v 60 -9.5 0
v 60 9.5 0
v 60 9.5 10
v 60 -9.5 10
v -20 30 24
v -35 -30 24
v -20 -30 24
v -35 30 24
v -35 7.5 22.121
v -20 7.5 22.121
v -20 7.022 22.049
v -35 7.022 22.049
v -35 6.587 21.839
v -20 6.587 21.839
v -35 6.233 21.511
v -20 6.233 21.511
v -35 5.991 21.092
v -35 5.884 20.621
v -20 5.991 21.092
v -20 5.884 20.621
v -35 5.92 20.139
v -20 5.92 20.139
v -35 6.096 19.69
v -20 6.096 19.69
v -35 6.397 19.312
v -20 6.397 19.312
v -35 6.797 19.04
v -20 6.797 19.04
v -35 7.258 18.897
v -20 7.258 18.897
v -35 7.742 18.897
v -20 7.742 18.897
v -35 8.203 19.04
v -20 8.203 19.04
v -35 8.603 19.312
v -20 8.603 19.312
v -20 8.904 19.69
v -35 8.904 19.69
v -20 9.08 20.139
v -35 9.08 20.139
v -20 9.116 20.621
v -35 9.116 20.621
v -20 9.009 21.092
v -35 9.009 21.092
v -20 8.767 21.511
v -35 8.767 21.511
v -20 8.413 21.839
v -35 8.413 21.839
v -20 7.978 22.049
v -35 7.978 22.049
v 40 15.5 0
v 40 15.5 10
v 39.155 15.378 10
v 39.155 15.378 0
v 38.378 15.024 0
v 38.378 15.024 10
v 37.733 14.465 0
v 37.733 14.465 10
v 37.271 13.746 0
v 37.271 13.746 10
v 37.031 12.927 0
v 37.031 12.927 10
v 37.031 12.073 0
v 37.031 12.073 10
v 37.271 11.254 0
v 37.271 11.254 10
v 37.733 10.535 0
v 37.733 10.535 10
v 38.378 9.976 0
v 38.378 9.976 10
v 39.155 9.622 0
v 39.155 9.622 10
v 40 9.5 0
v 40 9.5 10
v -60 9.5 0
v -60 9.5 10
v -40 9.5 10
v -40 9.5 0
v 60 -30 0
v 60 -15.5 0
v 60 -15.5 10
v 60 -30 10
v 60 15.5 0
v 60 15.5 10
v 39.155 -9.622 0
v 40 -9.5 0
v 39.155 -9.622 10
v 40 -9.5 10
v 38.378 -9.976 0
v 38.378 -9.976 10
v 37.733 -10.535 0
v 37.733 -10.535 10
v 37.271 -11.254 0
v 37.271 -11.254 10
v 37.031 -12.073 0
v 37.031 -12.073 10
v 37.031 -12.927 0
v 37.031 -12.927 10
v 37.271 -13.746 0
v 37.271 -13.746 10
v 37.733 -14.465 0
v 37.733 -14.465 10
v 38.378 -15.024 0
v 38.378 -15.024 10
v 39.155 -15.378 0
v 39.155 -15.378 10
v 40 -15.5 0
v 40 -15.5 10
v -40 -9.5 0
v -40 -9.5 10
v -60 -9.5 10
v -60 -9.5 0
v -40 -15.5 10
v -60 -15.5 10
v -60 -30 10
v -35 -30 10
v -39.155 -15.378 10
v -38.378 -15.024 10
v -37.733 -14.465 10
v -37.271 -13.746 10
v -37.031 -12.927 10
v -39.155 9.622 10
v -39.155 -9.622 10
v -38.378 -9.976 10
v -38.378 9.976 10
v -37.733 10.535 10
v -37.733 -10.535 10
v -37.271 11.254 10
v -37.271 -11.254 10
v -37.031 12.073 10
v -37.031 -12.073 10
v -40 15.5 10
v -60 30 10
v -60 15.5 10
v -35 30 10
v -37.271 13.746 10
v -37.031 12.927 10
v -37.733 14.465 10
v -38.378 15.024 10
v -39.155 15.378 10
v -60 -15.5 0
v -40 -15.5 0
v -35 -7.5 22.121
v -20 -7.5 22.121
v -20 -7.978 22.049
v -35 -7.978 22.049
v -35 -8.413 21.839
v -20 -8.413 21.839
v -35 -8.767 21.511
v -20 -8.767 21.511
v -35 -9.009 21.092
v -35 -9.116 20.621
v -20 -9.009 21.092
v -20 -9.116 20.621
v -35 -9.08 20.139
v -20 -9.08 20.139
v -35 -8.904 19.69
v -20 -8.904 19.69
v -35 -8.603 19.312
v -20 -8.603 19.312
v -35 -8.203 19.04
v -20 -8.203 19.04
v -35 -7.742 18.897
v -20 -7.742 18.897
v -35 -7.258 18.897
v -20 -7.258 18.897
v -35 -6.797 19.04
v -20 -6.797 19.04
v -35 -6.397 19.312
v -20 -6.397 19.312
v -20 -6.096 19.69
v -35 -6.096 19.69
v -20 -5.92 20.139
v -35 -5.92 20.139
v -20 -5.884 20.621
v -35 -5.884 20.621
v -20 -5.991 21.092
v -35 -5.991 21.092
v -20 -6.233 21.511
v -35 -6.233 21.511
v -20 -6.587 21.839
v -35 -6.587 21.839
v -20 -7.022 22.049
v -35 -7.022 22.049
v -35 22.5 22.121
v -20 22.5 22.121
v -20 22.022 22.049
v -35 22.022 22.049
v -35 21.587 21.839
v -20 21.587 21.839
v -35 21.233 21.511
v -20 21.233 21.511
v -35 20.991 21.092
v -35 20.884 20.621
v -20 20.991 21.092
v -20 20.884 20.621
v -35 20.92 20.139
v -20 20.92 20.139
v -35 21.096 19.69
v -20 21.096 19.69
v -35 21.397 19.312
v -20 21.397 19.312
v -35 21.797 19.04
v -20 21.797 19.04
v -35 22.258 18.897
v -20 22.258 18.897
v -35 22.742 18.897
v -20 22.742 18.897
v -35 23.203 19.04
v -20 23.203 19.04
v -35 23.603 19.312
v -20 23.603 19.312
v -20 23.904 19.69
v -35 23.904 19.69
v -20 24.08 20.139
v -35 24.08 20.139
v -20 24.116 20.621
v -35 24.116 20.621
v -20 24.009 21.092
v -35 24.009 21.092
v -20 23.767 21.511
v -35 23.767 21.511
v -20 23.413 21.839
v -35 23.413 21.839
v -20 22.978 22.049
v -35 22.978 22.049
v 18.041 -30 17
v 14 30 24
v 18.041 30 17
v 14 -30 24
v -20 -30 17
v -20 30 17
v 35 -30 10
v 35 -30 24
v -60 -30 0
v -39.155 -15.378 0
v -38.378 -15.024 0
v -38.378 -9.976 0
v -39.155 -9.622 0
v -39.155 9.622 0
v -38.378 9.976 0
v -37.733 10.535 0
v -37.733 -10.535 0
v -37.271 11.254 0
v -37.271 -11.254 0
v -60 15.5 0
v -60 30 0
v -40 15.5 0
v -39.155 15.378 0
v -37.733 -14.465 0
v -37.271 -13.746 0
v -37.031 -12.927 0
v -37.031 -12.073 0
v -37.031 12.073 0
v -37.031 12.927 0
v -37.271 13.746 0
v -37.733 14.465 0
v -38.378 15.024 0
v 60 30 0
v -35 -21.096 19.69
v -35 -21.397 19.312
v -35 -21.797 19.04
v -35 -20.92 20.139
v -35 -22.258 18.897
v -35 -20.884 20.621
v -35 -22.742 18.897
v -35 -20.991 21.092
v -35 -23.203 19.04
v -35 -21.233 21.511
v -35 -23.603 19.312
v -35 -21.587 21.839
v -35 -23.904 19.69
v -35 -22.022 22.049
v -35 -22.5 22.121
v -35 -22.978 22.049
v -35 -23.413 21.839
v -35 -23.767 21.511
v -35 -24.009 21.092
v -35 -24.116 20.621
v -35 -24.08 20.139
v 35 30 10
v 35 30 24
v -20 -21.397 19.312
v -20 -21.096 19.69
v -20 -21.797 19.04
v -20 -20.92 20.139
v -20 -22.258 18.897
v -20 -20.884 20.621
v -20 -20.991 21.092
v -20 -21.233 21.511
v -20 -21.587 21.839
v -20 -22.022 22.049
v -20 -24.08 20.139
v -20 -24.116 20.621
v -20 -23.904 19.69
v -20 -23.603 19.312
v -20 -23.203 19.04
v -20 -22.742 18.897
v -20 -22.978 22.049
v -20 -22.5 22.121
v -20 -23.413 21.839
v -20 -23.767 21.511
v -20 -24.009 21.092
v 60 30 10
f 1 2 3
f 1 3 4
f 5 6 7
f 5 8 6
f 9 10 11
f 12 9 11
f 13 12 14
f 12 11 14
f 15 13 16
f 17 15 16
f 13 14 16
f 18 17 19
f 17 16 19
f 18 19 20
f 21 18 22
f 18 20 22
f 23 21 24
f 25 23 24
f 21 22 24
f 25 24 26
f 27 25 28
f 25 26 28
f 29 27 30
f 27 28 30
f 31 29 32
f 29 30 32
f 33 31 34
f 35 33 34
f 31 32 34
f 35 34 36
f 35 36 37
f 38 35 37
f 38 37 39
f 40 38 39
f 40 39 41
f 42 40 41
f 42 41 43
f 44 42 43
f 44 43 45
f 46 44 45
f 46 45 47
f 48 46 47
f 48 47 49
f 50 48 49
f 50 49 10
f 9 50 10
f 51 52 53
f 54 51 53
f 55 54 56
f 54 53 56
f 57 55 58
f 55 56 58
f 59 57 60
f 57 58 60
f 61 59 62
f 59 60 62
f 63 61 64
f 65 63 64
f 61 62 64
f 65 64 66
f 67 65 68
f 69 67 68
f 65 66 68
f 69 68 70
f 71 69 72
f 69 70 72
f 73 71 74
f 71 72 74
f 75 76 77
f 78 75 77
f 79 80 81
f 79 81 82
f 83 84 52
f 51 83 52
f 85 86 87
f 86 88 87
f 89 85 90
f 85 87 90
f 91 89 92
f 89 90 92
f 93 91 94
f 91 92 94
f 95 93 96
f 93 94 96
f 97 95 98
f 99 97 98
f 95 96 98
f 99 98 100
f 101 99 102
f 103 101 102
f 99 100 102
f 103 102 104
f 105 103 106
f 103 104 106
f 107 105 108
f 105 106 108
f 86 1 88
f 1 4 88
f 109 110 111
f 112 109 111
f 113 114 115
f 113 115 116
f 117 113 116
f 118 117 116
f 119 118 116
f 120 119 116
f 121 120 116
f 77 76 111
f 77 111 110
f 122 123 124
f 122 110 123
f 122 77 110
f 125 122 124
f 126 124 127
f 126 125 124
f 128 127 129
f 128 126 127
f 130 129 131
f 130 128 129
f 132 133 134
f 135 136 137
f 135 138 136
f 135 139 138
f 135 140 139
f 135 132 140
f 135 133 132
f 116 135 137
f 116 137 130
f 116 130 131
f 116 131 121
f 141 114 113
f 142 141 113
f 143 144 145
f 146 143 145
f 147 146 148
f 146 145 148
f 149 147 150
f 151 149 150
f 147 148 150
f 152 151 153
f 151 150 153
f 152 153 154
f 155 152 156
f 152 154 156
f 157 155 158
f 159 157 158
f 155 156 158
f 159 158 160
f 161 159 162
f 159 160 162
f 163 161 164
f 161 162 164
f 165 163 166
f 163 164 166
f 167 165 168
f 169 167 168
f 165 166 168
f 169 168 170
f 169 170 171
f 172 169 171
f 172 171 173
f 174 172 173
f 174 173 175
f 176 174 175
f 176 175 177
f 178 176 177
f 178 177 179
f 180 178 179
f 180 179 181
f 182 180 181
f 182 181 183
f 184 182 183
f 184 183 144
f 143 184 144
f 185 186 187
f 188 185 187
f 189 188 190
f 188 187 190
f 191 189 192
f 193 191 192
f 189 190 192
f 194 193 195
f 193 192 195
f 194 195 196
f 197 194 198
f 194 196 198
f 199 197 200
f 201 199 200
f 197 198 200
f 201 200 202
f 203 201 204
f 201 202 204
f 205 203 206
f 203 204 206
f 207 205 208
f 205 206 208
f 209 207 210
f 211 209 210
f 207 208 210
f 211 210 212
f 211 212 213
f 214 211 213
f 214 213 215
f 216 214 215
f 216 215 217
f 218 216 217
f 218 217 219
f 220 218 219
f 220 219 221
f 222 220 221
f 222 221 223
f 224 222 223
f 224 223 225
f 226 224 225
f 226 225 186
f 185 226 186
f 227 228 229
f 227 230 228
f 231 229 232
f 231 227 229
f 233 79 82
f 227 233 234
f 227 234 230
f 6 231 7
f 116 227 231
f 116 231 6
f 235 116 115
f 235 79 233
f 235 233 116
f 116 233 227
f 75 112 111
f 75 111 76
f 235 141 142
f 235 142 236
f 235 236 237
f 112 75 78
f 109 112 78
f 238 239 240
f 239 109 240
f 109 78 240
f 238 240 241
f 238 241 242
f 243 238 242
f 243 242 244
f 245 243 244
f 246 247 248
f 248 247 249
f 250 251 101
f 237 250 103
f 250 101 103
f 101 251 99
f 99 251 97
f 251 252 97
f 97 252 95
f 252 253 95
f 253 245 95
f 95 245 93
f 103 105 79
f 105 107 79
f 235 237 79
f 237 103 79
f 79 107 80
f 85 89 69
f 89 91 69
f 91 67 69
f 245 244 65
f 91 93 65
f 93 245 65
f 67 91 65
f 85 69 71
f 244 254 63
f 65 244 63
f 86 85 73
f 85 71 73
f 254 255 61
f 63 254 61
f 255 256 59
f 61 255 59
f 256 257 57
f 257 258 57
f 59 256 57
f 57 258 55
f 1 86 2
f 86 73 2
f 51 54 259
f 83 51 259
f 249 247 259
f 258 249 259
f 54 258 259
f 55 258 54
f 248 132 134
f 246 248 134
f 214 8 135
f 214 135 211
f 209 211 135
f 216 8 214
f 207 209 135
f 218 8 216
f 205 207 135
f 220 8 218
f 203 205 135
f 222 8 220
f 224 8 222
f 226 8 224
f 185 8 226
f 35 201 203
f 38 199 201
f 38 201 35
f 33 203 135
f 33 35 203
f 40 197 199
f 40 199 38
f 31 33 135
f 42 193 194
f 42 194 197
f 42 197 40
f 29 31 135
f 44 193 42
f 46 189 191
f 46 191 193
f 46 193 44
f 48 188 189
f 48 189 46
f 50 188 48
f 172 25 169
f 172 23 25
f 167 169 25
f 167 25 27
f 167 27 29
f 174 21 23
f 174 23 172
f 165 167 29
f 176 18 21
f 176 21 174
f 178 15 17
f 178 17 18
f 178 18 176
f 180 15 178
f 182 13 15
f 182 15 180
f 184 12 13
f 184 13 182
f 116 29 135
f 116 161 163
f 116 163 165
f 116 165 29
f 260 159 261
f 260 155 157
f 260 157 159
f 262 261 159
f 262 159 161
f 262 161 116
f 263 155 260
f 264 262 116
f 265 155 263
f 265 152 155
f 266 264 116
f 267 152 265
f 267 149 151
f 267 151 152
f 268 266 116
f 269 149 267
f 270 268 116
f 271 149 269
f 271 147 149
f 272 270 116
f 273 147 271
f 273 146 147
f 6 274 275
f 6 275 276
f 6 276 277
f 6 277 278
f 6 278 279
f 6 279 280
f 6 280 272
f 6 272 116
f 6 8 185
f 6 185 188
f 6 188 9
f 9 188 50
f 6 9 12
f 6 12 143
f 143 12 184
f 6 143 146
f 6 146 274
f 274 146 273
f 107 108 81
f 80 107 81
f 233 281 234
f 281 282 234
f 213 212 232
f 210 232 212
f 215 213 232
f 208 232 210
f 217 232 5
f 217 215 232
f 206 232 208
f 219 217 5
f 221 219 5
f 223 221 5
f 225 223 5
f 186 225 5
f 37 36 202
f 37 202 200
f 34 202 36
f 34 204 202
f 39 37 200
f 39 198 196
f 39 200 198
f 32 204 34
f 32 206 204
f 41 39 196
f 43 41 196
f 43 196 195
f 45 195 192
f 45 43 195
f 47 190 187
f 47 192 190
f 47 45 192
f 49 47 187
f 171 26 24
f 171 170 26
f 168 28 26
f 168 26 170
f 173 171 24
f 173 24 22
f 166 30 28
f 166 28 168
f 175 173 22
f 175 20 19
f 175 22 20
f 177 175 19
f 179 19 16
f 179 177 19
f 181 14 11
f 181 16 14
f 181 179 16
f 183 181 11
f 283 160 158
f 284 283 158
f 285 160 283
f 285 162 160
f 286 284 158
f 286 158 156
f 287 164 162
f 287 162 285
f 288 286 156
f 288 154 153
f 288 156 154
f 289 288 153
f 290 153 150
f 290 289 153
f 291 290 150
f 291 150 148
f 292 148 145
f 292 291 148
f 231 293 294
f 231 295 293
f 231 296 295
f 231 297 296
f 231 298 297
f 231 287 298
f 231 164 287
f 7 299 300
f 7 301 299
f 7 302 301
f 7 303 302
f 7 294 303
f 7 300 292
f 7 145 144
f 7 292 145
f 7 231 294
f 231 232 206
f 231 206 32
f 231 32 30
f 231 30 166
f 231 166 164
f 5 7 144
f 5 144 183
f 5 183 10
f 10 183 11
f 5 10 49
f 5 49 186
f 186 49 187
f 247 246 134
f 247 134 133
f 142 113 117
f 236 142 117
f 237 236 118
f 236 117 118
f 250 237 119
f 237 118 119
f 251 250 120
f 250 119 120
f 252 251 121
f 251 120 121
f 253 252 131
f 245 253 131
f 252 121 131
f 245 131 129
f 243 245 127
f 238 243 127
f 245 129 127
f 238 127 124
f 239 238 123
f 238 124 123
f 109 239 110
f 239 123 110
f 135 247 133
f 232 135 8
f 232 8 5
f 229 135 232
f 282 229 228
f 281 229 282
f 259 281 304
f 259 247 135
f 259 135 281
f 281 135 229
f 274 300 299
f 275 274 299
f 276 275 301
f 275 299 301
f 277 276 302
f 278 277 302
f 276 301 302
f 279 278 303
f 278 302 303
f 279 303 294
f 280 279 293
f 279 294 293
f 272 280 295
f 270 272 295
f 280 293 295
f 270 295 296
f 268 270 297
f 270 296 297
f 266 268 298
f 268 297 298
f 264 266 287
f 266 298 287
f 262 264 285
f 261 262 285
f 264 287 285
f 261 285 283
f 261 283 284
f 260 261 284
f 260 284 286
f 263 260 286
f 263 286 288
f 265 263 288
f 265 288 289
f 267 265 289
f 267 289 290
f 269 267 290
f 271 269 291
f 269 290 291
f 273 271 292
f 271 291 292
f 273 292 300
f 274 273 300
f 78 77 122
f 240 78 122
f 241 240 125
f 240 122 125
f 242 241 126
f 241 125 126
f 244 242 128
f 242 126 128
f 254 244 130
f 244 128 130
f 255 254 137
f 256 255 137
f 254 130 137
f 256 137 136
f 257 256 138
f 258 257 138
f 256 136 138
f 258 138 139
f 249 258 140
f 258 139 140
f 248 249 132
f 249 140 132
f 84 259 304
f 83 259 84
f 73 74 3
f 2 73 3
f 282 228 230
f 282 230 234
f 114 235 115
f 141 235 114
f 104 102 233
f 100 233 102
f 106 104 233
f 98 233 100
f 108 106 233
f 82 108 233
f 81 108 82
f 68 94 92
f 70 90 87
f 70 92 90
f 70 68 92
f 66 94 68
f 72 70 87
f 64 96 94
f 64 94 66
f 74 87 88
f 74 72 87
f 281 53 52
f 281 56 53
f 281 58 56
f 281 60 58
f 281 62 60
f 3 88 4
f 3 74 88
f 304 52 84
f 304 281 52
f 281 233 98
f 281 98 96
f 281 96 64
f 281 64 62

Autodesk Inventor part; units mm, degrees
ref_plane "YZ Plane" through (0, 0, 0) normal (1, 0, 0) x (0, 1, 0)
ref_plane "XZ Plane" through (0, 0, 0) normal (0, 1, 0) x (-1, 0, 0)
ref_plane "XY Plane" through (0, 0, 0) normal (0, 0, 1) x (1, 0, 0)
sketch "Sketch1" plane through (0, 0, 0) normal (0, 0, 1) x (1, 0, 0)
  line L0 (0, 57.1566) -> (0, -74.2716) construction
  line L1 (-84, 0) -> (84, 0) construction
  line L2 (-60, 30) -> (60, 30)
  line L3 (60, 30) -> (60, -30)
  line L4 (60, -30) -> (-60, -30)
  line L5 (-60, -30) -> (-60, 30)
  point P0 (0, 0)
  dimension "d0" = 120
  dimension "d1" = 60
extrude "Extrusion1" add sketch "Sketch1" along normal blind 24
sketch "Sketch2" plane through (-60, -30, 0) normal (0, -1, 0) x (1, 0, 0)
  line L0 (120, 24) -> (0, 24) projected
  line L1 (60, 28.8) -> (60, -4.8) construction
  line L2 (-24, 0) -> (144, 0) construction
  line L3 (41.9586, 17) -> (78.0414, 17) construction
  line L4 (41.9586, 17) -> (46.0001, 24) construction
  line L5 (41.9586, 17) -> (50.0416, 17) construction
  line L6 (78.0414, 17) -> (63.0829, 17) construction
  line L7 (73.9999, 24) -> (46.0001, 24) construction
  line L8 (73.9999, 24) -> (78.0414, 17)
  line L9 (78.0414, 17) -> (40, 17)
  line L10 (40, 17) -> (40, 24)
  line L11 (73.9999, 24) -> (40, 24)
  point P0 (60, 0)
  point P1 (77.464, 18)
  dimension "d5" = 60
  dimension "d7" = 7
  dimension "d37" = 1
  dimension "d39" = 17.464
  dimension "d40" = 60
  dimension "d64" = 20
extrude "Extrusion2" cut sketch "Sketch2" against normal up to next
sketch "Sketch9" plane through (0, 0, 24) normal (0, 0, 1) x (1, 0, 0)
  line L0 (0, 57.1566) -> (0, -74.2716) construction
  line L1 (-84, 0) -> (84, 0) construction
  line L2 (25, 37.3826) -> (25, -38.2478) construction
  line L3 (50, 36.5596) -> (50, -55.4961) construction
  line L4 (-25, 38.3811) -> (-25, -39.94) construction
  line L5 (-50, 35.8185) -> (-50, -44.962) construction
  line L6 (-20, -30) -> (-20, 30) construction
  line L7 (-60, 30) -> (-20, 30) construction
  line L8 (-60, -30) -> (-60, 30) construction
  line L9 (-20, -30) -> (-60, -30) construction
  line L10 (13.9999, 30) -> (13.9999, -30) construction
  line L11 (60, -30) -> (13.9999, -30) construction
  line L12 (60, 30) -> (60, -30) construction
  line L13 (13.9999, 30) -> (60, 30) construction
  line L14 (60, -30) -> (-60, -30) projected
  line L15 (-60, 30) -> (-35, 30)
  line L16 (-35, 30) -> (-35, -30)
  line L17 (-35, -30) -> (-60, -30)
  line L18 (-60, -30) -> (-60, 30)
  line L19 (13.9999, 30) -> (60, 30) projected
  line L20 (60, -30) -> (13.9999, -30) projected
  line L21 (60, 30) -> (35, 30)
  line L22 (35, 30) -> (35, -30)
  line L23 (35, -30) -> (60, -30)
  line L24 (60, -30) -> (60, 30)
  point P0 (0, 0)
  dimension "d65" = 25
  dimension "d66" = 25
  dimension "d67" = 25
  dimension "d68" = 25
  dimension "d69" = 25
  dimension "d70" = 25
extrude "Extrusion7" cut sketch "Sketch9" against normal blind 14
sketch "Sketch10" plane through (0, 0, 10) normal (0, 0, 1) x (1, 0, 0)
  line L0 (-60, -30) -> (-60, 30) construction
  line L1 (-35, -30) -> (-60, -30) construction
  line L2 (-35, 30) -> (-35, -30) construction
  line L3 (-60, 30) -> (-35, 30) construction
  line L4 (60, -30) -> (35, -30) construction
  line L5 (60, 30) -> (60, -30) construction
  line L6 (35, 30) -> (60, 30) construction
  line L7 (35, -30) -> (35, 30) construction
  line L8 (-88.2, 0) -> (88.2, 0) construction
  line L9 (0, 42) -> (0, -42) construction
  line L10 (-60, -30) -> (-60, 30) construction
  line L11 (-60, 12.5) -> (60, 12.5) construction
  line L12 (60, 30) -> (60, -30) construction
  line L13 (-60, -12.5) -> (60, -12.5) construction
  line L14 (-60, 12.5) -> (-40, 12.5) construction
  line L15 (-60, 9.5) -> (-40, 9.5)
  line L16 (-40, 15.5) -> (-60, 15.5)
  arc A0 (-60, 15.5) -> (-60, 9.5) centre (-60, 12.5) ccw
  arc A1 (-40, 9.5) -> (-40, 15.5) centre (-40, 12.5) ccw
  line L17 (-60, -12.5) -> (-40, -12.5) construction
  line L18 (-60, -15.5) -> (-40, -15.5)
  line L19 (-40, -9.5) -> (-60, -9.5)
  arc A2 (-60, -9.5) -> (-60, -15.5) centre (-60, -12.5) ccw
  arc A3 (-40, -15.5) -> (-40, -9.5) centre (-40, -12.5) ccw
  line L20 (60, 12.5) -> (40, 12.5) construction
  line L21 (60, 15.5) -> (40, 15.5)
  line L22 (40, 9.5) -> (60, 9.5)
  arc A4 (60, 9.5) -> (60, 15.5) centre (60, 12.5) ccw
  arc A5 (40, 15.5) -> (40, 9.5) centre (40, 12.5) ccw
  line L23 (60, -12.5) -> (40, -12.5) construction
  line L24 (60, -9.5) -> (40, -9.5)
  line L25 (40, -15.5) -> (60, -15.5)
  arc A6 (60, -15.5) -> (60, -9.5) centre (60, -12.5) ccw
  arc A7 (40, -9.5) -> (40, -15.5) centre (40, -12.5) ccw
  point P0 (0, 0)
  point P1 (-50, 12.5)
  point P2 (-50, -12.5)
  point P3 (50, 12.5)
  point P4 (50, -12.5)
  dimension "d73" = 12.5
  dimension "d74" = 12.5
  dimension "d75" = 6
  dimension "d76" = 20
  dimension "d77" = 6
  dimension "d78" = 20
  dimension "d79" = 6
  dimension "d80" = 20
  dimension "d81" = 6
  dimension "d82" = 20
extrude "Extrusion8" cut sketch "Sketch10" against normal up to next
sketch "Sketch11" plane through (-35, -30, 24) normal (-1, 0, 0) x (0, 0, 1)
  line L0 (-7, 0) -> (-7, 60) construction
  line L1 (0, 60) -> (0, 0) construction
  line L2 (-14, 60) -> (0, 60) construction
  line L3 (-14, 60) -> (-14, 0) construction
  line L4 (0, 0) -> (-14, 0) construction
  line L5 (-3.5, 60) -> (-3.5, 0) construction
  line L6 (0, 0) -> (-14, 0) construction
  point P0 (-24, 30)
  point P1 (-3.5, 7.5)
  point P2 (-3.5, 22.5)
  point P3 (-3.5, 37.5)
  point P4 (-3.5, 52.5)
  dimension "d85" = 3.5
  dimension "d86" = 7.5
  dimension "d87" = 15
  dimension "d88" = 15
  dimension "d89" = 15
hole "Hole3" at (-35, -22.5, 20.5) at (-35, -7.5, 20.5) at (-35, 7.5, 20.5) at (-35, 22.5, 20.5) direction (1, 0, 0) diameter 3.242 end up to surface thread size "M4x0.7" class "6H" standard "ANSI Metric M Profile"
properties part number "MVX-10-Bracket-V5"
